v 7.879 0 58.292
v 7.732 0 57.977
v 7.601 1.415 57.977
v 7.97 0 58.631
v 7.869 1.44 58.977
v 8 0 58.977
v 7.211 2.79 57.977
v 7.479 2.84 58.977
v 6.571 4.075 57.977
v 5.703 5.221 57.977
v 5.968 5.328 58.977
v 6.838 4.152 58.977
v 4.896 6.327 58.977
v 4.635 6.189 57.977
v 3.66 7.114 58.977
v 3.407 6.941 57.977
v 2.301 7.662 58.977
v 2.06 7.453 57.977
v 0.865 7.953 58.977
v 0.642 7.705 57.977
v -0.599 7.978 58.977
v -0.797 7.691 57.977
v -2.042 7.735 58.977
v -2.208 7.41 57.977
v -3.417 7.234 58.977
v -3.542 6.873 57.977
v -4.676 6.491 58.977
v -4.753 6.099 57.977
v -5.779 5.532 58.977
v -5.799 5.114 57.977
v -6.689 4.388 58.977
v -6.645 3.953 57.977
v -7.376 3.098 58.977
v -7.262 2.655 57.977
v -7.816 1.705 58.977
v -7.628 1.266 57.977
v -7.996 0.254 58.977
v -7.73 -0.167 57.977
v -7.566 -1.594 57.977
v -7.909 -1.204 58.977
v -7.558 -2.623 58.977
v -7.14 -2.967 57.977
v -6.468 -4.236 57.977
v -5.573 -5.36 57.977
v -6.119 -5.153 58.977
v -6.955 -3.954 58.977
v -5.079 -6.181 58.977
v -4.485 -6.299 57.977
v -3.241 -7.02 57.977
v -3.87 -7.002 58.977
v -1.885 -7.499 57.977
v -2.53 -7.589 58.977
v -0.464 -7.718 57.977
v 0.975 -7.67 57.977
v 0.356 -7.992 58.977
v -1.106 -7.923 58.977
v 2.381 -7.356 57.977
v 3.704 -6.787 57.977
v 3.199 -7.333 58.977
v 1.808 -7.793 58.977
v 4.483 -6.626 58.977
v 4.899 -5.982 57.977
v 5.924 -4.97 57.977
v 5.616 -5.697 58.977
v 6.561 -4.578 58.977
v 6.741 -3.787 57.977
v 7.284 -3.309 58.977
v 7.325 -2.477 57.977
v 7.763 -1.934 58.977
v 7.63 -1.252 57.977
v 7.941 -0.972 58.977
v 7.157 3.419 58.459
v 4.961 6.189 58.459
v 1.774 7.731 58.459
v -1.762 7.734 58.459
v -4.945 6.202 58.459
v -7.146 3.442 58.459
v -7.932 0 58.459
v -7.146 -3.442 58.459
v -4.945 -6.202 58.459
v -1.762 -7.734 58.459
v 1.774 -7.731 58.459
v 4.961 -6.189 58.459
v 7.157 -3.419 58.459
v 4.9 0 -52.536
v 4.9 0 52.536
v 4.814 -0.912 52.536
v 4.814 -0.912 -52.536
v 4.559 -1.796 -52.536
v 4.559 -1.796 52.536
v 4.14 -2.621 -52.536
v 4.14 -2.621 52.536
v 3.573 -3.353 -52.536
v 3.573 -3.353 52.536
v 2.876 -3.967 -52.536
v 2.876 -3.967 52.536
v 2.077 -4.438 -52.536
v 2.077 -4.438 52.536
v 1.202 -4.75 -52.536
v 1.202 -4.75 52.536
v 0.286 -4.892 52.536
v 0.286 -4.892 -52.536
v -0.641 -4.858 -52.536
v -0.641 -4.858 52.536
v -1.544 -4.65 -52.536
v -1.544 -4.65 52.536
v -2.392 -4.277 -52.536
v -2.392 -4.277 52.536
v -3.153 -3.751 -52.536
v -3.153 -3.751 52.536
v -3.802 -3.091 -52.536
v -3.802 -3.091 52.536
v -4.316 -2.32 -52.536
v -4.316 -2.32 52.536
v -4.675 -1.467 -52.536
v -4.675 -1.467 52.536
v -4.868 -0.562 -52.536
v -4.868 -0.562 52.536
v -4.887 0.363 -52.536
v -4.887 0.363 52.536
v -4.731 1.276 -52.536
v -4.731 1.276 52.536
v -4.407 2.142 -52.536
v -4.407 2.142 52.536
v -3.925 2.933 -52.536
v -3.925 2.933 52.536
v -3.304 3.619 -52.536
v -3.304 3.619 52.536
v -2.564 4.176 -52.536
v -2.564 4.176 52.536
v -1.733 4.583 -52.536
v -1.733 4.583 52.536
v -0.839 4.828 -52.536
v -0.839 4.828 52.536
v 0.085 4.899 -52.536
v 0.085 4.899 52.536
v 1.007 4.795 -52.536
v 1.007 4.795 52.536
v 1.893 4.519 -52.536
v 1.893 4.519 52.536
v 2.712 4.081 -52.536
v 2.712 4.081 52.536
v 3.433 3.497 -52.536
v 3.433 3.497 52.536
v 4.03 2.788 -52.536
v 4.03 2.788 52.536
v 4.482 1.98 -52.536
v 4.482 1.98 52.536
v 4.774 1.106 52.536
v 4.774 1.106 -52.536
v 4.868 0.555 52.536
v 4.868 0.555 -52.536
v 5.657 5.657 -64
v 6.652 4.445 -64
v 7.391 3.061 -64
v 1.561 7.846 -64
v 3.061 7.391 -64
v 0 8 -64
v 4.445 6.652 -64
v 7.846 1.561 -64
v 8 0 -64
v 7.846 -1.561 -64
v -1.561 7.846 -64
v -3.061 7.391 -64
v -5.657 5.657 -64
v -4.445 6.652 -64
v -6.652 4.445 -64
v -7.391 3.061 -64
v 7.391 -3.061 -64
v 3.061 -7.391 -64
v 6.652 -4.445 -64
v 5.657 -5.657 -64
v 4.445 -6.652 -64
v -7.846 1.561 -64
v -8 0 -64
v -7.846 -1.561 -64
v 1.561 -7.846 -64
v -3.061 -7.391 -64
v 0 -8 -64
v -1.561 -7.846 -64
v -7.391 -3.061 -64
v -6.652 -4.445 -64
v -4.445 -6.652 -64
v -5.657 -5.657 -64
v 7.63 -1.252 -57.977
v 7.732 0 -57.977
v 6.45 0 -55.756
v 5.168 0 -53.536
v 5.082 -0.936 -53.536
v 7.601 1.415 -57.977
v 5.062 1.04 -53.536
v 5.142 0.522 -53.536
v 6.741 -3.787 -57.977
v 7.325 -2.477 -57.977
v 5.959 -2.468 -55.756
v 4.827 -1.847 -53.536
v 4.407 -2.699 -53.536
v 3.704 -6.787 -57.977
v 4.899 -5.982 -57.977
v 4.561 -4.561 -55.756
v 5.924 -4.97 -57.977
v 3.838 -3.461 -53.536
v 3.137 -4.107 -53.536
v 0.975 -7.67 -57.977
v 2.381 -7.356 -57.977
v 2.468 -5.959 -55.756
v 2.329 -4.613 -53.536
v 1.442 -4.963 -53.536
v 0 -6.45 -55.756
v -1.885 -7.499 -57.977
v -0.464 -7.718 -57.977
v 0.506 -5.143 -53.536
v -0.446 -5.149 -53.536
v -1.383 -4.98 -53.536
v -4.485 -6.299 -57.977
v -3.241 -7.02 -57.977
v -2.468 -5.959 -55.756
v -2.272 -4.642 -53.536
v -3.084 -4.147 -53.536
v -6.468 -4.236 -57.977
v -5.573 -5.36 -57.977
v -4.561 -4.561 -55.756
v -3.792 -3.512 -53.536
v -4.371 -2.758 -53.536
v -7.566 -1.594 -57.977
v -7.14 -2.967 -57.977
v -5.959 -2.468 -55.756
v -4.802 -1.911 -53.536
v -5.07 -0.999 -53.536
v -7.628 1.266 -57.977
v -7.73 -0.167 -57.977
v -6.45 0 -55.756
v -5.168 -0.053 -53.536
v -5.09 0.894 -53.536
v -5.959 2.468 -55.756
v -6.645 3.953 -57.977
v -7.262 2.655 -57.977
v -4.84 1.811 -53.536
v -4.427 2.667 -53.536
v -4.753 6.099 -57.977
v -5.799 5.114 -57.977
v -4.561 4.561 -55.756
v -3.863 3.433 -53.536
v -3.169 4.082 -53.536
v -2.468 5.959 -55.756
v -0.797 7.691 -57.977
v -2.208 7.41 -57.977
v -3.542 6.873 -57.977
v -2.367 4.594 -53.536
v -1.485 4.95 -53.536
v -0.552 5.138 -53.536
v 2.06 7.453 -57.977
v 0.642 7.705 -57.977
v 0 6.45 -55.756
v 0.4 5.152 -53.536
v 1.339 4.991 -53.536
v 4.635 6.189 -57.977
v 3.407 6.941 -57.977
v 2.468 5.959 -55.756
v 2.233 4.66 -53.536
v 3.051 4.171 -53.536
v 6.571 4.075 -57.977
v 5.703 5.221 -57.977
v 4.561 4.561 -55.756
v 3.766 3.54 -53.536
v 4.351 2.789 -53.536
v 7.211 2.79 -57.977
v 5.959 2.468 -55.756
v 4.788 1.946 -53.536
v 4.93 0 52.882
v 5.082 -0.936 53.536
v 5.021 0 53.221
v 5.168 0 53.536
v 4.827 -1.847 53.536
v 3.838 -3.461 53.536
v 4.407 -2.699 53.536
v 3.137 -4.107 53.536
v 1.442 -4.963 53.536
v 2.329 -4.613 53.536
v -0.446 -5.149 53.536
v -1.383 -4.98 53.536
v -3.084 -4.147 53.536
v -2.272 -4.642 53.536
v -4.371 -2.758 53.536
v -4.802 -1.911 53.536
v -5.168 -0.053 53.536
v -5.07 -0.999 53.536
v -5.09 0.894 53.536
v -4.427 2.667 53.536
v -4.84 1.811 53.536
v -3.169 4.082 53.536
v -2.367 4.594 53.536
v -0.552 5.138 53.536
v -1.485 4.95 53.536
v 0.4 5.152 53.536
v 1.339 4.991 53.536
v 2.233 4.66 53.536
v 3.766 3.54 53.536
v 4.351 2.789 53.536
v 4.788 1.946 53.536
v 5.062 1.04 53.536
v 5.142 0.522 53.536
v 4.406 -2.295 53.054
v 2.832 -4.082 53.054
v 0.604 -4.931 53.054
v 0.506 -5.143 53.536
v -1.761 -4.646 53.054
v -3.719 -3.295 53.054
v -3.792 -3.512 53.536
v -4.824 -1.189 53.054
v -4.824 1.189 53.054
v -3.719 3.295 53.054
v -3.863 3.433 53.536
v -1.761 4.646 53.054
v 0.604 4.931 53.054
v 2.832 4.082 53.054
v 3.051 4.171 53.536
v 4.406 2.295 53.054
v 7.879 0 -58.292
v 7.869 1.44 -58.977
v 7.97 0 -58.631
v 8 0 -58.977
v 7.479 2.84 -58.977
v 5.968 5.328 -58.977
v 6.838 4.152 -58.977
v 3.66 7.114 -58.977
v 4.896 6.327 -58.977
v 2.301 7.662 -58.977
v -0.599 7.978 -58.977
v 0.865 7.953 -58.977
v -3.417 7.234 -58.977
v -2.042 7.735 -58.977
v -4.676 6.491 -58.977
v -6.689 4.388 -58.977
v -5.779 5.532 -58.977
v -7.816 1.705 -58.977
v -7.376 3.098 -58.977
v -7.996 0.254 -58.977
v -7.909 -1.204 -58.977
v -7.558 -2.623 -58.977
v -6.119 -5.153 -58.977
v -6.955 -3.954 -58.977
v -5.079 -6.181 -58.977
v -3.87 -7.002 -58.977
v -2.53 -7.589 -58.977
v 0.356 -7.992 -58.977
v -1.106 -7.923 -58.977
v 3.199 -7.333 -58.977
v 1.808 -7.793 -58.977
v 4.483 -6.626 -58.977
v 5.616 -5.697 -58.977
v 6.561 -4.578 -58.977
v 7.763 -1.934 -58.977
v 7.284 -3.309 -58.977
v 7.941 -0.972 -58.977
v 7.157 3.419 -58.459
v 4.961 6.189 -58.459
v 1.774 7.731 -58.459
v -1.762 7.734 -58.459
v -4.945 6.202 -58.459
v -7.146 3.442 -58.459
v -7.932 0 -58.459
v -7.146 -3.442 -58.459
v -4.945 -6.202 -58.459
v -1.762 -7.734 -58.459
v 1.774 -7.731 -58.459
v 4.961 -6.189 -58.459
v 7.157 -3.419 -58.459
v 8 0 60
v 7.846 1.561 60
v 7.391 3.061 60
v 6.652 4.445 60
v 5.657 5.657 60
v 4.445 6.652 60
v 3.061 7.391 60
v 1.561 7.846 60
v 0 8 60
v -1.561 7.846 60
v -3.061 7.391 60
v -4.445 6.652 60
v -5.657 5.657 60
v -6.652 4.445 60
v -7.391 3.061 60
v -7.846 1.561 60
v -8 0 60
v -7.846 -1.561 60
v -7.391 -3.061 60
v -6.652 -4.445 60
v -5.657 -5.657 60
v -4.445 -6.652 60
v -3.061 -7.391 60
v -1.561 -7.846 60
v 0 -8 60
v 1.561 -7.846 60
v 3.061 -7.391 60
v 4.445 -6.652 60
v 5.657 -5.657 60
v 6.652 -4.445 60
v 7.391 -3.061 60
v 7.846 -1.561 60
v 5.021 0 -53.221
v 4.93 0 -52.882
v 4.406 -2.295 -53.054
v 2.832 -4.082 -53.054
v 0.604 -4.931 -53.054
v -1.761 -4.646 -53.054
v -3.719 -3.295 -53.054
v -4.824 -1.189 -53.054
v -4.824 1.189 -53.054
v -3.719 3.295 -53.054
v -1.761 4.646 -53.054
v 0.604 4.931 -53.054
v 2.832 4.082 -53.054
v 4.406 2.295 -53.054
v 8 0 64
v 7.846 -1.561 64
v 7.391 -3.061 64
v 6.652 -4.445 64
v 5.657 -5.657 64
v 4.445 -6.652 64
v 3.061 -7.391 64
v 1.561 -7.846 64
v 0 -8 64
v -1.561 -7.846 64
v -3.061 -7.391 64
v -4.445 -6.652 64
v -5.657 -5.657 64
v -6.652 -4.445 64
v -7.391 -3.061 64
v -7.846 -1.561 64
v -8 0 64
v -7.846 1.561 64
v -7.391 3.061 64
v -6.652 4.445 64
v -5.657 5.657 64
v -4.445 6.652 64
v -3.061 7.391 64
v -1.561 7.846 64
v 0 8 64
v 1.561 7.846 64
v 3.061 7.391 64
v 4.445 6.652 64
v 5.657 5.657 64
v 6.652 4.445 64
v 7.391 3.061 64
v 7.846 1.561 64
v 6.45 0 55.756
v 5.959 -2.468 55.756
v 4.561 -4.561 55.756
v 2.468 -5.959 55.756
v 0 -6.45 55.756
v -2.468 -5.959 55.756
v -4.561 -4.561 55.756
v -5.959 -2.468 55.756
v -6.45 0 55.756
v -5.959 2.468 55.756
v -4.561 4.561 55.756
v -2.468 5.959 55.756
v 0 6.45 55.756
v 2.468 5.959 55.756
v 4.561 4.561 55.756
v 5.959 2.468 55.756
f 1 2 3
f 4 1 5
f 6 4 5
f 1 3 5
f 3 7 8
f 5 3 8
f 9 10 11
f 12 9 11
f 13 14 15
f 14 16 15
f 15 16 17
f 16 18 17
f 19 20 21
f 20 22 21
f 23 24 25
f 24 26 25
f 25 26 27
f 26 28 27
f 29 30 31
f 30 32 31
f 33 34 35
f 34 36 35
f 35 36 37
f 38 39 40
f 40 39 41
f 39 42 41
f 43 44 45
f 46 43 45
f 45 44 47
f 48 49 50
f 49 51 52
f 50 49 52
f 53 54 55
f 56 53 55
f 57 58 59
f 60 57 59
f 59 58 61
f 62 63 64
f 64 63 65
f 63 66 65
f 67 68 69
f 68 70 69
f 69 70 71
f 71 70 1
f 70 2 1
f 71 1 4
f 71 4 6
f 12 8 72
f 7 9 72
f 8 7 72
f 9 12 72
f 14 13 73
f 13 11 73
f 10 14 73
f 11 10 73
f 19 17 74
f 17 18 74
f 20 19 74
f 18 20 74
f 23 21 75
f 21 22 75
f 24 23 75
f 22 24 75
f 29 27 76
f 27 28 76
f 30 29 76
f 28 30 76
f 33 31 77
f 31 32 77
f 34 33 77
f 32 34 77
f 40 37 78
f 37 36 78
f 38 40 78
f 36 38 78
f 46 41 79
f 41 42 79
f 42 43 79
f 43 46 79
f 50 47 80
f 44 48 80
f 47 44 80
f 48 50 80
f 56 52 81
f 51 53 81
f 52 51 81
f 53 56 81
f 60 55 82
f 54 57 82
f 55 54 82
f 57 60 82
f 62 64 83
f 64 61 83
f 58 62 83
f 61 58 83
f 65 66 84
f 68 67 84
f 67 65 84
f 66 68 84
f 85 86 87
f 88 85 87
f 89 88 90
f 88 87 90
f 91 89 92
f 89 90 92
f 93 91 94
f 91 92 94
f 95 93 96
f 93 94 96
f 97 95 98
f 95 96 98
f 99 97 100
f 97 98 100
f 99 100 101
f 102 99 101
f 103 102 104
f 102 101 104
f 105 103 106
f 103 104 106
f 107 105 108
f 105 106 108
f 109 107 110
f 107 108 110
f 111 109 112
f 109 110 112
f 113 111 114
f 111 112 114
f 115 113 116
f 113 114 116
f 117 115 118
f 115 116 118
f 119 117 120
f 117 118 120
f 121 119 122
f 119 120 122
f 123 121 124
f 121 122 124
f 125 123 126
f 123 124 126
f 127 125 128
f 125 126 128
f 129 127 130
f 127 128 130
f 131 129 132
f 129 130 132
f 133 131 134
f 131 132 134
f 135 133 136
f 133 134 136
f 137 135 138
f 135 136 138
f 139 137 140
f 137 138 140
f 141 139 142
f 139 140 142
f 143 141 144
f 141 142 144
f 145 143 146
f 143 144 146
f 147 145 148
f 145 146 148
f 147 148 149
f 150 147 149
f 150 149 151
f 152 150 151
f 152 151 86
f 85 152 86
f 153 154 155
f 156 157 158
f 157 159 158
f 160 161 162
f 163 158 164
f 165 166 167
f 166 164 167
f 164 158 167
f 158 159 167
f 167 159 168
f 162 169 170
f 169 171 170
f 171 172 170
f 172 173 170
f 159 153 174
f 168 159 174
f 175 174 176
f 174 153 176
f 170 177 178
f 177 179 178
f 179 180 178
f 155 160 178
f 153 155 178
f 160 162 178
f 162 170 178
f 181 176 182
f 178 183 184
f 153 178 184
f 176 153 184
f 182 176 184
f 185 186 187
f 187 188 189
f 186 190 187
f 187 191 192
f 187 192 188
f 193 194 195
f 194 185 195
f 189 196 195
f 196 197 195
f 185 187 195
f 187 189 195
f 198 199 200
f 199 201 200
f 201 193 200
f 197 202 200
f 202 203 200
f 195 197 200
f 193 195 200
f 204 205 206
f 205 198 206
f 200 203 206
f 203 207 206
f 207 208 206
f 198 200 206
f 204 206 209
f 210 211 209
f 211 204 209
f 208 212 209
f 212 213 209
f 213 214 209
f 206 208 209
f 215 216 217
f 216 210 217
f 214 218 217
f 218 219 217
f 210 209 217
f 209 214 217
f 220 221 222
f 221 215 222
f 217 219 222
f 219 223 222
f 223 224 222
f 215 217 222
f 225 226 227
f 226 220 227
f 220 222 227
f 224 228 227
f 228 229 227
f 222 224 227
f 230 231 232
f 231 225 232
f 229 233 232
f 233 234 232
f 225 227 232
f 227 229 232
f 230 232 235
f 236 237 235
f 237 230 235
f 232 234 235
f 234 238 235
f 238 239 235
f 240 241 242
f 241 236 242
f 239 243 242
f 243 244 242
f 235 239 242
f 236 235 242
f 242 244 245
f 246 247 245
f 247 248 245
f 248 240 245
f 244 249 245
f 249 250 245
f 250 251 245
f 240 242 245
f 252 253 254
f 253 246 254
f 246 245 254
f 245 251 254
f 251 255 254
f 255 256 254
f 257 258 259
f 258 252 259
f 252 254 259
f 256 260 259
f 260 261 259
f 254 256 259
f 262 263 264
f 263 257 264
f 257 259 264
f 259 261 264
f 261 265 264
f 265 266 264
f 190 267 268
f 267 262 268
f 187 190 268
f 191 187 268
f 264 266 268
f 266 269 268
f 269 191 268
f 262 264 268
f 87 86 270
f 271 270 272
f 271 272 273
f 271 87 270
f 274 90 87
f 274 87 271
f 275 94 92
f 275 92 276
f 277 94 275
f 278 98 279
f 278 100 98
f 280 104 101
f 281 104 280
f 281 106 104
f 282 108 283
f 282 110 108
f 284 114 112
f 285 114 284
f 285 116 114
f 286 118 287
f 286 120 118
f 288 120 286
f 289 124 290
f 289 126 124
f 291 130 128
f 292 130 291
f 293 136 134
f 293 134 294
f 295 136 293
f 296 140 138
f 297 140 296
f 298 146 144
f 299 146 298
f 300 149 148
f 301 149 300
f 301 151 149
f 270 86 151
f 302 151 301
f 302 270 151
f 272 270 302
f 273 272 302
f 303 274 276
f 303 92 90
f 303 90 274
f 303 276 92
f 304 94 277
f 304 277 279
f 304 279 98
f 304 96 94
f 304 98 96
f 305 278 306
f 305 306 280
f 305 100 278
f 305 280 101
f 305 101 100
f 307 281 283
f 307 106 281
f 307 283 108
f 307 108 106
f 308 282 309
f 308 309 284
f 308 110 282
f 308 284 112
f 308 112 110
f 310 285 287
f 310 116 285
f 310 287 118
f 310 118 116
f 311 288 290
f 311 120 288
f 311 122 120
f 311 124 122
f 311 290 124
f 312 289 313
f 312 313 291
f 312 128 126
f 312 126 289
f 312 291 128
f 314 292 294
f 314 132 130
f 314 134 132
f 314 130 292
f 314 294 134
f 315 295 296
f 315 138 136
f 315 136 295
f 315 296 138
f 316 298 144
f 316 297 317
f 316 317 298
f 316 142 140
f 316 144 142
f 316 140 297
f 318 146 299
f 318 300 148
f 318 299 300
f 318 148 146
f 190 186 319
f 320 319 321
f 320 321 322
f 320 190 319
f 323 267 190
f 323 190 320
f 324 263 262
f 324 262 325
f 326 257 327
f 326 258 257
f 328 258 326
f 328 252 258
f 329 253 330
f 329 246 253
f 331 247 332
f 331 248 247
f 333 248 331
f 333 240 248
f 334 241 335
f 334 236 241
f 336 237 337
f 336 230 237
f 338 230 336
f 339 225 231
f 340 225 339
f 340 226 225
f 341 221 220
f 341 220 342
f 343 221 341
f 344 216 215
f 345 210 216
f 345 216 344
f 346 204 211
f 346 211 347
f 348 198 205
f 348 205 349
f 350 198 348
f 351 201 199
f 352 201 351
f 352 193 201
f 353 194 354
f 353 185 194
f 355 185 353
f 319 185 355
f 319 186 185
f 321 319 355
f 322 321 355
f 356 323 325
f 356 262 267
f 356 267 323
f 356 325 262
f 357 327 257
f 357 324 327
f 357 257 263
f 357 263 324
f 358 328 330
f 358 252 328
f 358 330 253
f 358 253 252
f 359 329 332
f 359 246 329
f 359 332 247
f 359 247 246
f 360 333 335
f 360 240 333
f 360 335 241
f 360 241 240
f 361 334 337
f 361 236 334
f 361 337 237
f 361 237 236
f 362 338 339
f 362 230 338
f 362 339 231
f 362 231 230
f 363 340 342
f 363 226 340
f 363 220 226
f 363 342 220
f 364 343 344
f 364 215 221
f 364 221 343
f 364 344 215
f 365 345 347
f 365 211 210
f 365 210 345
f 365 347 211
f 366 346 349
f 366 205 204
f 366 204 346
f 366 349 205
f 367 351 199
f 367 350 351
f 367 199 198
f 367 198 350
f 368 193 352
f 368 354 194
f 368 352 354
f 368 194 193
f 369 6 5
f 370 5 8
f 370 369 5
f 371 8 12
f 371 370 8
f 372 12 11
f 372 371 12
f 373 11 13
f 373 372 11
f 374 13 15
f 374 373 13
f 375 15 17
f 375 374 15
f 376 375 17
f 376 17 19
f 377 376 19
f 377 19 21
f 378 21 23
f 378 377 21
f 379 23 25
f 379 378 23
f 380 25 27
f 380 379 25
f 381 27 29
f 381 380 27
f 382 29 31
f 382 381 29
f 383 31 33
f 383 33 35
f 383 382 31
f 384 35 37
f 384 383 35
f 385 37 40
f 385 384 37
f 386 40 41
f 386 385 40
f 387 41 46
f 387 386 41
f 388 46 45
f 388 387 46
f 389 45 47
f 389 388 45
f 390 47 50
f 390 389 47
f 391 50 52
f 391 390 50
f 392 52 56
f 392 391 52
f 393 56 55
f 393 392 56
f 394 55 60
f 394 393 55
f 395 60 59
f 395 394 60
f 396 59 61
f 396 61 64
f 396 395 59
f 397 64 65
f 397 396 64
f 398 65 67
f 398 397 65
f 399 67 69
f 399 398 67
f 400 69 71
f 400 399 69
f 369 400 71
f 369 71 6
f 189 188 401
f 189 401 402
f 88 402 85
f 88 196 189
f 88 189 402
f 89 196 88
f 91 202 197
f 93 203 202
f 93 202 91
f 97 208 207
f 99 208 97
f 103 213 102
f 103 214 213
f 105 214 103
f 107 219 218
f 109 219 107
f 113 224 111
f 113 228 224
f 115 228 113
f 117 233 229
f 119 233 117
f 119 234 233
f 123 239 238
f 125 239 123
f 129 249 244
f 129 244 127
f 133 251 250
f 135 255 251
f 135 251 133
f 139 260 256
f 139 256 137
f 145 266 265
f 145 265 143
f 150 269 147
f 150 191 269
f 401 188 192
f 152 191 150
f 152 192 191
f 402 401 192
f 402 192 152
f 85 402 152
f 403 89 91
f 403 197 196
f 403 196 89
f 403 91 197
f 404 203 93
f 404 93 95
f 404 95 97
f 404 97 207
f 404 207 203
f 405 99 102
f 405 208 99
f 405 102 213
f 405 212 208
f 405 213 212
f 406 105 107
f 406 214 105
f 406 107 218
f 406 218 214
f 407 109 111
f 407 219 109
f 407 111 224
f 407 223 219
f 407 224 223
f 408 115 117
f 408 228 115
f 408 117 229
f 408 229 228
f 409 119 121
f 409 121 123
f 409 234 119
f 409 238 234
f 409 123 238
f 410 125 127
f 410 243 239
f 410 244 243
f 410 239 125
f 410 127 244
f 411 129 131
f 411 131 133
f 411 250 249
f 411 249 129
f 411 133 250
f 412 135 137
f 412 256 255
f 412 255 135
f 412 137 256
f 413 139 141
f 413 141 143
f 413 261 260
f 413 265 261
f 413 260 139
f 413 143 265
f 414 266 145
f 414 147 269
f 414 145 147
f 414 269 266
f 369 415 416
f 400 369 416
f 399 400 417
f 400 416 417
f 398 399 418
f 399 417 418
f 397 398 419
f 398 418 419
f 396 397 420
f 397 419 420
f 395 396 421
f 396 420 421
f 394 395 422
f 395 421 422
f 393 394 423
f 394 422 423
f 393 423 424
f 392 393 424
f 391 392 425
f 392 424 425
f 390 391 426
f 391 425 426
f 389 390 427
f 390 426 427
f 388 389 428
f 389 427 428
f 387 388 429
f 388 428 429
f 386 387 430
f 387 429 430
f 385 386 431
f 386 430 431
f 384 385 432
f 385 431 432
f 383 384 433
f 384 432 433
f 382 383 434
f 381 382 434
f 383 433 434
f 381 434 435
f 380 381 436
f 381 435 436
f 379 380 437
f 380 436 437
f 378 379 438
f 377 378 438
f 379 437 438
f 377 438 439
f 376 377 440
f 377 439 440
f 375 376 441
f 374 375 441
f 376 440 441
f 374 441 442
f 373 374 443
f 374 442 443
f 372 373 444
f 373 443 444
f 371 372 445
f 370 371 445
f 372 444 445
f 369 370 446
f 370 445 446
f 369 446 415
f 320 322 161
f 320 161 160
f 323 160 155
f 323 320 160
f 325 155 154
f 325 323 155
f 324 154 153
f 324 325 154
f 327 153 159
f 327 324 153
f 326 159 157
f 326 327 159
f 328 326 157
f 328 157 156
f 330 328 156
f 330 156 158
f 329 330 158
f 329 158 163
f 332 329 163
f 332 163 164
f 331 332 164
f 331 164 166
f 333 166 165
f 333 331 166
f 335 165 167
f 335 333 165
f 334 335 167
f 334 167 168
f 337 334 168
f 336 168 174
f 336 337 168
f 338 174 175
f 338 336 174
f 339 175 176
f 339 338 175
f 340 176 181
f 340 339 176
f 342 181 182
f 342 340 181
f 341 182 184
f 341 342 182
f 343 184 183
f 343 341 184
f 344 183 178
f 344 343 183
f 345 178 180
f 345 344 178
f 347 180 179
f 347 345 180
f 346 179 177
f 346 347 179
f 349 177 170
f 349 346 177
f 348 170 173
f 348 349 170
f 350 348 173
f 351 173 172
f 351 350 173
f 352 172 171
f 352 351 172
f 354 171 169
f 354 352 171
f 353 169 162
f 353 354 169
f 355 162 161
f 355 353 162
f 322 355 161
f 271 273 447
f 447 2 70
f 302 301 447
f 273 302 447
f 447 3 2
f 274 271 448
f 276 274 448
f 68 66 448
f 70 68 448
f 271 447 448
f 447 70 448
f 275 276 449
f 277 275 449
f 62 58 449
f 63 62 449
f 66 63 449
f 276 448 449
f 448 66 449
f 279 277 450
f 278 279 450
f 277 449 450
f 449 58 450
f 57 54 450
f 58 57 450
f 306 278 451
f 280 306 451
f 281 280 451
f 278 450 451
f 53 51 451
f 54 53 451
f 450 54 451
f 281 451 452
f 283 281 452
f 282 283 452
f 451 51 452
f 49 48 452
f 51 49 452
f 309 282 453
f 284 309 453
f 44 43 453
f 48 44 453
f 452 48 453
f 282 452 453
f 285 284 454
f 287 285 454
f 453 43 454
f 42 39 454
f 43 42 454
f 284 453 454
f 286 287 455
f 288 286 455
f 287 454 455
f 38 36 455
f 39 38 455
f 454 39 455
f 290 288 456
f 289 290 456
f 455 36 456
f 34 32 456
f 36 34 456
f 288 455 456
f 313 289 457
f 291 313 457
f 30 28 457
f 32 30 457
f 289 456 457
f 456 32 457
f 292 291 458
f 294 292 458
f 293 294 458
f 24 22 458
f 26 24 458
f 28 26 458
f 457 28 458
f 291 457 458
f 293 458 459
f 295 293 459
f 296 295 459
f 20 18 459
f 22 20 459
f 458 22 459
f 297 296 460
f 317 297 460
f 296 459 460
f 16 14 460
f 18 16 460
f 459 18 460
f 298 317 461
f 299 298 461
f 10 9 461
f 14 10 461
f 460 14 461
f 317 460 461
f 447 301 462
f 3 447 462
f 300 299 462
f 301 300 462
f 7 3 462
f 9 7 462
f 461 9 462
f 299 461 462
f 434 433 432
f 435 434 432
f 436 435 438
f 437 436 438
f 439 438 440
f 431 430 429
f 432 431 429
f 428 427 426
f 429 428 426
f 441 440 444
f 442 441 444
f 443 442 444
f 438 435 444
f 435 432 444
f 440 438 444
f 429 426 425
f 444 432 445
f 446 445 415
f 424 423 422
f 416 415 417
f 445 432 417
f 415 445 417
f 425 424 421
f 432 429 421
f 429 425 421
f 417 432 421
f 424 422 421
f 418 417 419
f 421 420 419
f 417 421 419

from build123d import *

# Parameters (mm, degrees)
F0_W        = 4.9
F0_H        = 60
F2_S5_R     = 8
F2_T6_DEPTH = 15
F3_S5_R     = 8
F3_T6_DEPTH = 15
F4_R        = 2


# Not quite as in the source:
# - a fillet or chamfer that OpenCascade refuses, or shapes differently, is made with other operations: its cross-section is extruded or revolved along the edge and cut away or added


with BuildPart() as f1:
    # F0 (on Front) → F1 (revolve)
    with BuildSketch(Plane.XZ):
        Polygon((0, 64), (0, 60), (4.9, 60), (8, 60), (8, 64), align=None)
        with Locations((2.45, 30)):
            Rectangle(F0_W, F0_H)
        with Locations((2.45, -30)):
            Rectangle(F0_W, F0_H)
        Polygon((4.9, -60), (0, -60), (0, -64), (8, -64), (8, -60), align=None)
    revolve(axis=Axis((0, 0, -30), (0, 0, -1)))

    # F2: chamfer of 4 x 6.9282032303 on 1 edges, made by hand


with BuildPart() as f2_tool2:
    # F2_s3 → F2_t4 (revolve)
    with BuildSketch(Plane.XZ):
        Polygon((4.9, 53.0717967697), (8.9, 60), (4.9, 60), align=None)
    revolve(axis=Axis((0, 0, 60), (0, 0, -1)))

    # F2_s5 → F2_t6 (intersect, symmetric)
    with BuildSketch(Plane.XY.offset(56.5)):
        Circle(F2_S5_R)
    extrude(amount=F2_T6_DEPTH, both=True, mode=Mode.INTERSECT)


with BuildPart() as f1_1:
    add(f1.part)

    # F2_t1: union F2_tool2
    add(f2_tool2.part)

    # F3: chamfer of 4 x 6.9282032303 on 1 edges, made by hand


with BuildPart() as f3_tool2:
    # F3_s3 → F3_t4 (revolve)
    with BuildSketch(Plane.XZ):
        Polygon((8.9, -60), (4.9, -53.0717967697), (4.9, -60), align=None)
    revolve(axis=Axis((0, 0, -60), (0, 0, -1)))

    # F3_s5 → F3_t6 (intersect, symmetric)
    with BuildSketch(Plane.XY.offset(-56.5)):
        Circle(F3_S5_R)
    extrude(amount=F3_T6_DEPTH, both=True, mode=Mode.INTERSECT)


with BuildPart() as f1_2:
    add(f1_1.part)

    # F3_t1: union F3_tool2
    add(f3_tool2.part)

    # F4
    f4_edges = [f1_2.edges().sort_by_distance(p)[0] for p in [
        (-8, 0, -58.441154),
        (-4.9, 0, -53.071797),
        (-4.9, 0, 53.071797),
        (-8, 0, 58.441154),
    ]]
    fillet(f4_edges, radius=F4_R)


solid = f1_2.part
